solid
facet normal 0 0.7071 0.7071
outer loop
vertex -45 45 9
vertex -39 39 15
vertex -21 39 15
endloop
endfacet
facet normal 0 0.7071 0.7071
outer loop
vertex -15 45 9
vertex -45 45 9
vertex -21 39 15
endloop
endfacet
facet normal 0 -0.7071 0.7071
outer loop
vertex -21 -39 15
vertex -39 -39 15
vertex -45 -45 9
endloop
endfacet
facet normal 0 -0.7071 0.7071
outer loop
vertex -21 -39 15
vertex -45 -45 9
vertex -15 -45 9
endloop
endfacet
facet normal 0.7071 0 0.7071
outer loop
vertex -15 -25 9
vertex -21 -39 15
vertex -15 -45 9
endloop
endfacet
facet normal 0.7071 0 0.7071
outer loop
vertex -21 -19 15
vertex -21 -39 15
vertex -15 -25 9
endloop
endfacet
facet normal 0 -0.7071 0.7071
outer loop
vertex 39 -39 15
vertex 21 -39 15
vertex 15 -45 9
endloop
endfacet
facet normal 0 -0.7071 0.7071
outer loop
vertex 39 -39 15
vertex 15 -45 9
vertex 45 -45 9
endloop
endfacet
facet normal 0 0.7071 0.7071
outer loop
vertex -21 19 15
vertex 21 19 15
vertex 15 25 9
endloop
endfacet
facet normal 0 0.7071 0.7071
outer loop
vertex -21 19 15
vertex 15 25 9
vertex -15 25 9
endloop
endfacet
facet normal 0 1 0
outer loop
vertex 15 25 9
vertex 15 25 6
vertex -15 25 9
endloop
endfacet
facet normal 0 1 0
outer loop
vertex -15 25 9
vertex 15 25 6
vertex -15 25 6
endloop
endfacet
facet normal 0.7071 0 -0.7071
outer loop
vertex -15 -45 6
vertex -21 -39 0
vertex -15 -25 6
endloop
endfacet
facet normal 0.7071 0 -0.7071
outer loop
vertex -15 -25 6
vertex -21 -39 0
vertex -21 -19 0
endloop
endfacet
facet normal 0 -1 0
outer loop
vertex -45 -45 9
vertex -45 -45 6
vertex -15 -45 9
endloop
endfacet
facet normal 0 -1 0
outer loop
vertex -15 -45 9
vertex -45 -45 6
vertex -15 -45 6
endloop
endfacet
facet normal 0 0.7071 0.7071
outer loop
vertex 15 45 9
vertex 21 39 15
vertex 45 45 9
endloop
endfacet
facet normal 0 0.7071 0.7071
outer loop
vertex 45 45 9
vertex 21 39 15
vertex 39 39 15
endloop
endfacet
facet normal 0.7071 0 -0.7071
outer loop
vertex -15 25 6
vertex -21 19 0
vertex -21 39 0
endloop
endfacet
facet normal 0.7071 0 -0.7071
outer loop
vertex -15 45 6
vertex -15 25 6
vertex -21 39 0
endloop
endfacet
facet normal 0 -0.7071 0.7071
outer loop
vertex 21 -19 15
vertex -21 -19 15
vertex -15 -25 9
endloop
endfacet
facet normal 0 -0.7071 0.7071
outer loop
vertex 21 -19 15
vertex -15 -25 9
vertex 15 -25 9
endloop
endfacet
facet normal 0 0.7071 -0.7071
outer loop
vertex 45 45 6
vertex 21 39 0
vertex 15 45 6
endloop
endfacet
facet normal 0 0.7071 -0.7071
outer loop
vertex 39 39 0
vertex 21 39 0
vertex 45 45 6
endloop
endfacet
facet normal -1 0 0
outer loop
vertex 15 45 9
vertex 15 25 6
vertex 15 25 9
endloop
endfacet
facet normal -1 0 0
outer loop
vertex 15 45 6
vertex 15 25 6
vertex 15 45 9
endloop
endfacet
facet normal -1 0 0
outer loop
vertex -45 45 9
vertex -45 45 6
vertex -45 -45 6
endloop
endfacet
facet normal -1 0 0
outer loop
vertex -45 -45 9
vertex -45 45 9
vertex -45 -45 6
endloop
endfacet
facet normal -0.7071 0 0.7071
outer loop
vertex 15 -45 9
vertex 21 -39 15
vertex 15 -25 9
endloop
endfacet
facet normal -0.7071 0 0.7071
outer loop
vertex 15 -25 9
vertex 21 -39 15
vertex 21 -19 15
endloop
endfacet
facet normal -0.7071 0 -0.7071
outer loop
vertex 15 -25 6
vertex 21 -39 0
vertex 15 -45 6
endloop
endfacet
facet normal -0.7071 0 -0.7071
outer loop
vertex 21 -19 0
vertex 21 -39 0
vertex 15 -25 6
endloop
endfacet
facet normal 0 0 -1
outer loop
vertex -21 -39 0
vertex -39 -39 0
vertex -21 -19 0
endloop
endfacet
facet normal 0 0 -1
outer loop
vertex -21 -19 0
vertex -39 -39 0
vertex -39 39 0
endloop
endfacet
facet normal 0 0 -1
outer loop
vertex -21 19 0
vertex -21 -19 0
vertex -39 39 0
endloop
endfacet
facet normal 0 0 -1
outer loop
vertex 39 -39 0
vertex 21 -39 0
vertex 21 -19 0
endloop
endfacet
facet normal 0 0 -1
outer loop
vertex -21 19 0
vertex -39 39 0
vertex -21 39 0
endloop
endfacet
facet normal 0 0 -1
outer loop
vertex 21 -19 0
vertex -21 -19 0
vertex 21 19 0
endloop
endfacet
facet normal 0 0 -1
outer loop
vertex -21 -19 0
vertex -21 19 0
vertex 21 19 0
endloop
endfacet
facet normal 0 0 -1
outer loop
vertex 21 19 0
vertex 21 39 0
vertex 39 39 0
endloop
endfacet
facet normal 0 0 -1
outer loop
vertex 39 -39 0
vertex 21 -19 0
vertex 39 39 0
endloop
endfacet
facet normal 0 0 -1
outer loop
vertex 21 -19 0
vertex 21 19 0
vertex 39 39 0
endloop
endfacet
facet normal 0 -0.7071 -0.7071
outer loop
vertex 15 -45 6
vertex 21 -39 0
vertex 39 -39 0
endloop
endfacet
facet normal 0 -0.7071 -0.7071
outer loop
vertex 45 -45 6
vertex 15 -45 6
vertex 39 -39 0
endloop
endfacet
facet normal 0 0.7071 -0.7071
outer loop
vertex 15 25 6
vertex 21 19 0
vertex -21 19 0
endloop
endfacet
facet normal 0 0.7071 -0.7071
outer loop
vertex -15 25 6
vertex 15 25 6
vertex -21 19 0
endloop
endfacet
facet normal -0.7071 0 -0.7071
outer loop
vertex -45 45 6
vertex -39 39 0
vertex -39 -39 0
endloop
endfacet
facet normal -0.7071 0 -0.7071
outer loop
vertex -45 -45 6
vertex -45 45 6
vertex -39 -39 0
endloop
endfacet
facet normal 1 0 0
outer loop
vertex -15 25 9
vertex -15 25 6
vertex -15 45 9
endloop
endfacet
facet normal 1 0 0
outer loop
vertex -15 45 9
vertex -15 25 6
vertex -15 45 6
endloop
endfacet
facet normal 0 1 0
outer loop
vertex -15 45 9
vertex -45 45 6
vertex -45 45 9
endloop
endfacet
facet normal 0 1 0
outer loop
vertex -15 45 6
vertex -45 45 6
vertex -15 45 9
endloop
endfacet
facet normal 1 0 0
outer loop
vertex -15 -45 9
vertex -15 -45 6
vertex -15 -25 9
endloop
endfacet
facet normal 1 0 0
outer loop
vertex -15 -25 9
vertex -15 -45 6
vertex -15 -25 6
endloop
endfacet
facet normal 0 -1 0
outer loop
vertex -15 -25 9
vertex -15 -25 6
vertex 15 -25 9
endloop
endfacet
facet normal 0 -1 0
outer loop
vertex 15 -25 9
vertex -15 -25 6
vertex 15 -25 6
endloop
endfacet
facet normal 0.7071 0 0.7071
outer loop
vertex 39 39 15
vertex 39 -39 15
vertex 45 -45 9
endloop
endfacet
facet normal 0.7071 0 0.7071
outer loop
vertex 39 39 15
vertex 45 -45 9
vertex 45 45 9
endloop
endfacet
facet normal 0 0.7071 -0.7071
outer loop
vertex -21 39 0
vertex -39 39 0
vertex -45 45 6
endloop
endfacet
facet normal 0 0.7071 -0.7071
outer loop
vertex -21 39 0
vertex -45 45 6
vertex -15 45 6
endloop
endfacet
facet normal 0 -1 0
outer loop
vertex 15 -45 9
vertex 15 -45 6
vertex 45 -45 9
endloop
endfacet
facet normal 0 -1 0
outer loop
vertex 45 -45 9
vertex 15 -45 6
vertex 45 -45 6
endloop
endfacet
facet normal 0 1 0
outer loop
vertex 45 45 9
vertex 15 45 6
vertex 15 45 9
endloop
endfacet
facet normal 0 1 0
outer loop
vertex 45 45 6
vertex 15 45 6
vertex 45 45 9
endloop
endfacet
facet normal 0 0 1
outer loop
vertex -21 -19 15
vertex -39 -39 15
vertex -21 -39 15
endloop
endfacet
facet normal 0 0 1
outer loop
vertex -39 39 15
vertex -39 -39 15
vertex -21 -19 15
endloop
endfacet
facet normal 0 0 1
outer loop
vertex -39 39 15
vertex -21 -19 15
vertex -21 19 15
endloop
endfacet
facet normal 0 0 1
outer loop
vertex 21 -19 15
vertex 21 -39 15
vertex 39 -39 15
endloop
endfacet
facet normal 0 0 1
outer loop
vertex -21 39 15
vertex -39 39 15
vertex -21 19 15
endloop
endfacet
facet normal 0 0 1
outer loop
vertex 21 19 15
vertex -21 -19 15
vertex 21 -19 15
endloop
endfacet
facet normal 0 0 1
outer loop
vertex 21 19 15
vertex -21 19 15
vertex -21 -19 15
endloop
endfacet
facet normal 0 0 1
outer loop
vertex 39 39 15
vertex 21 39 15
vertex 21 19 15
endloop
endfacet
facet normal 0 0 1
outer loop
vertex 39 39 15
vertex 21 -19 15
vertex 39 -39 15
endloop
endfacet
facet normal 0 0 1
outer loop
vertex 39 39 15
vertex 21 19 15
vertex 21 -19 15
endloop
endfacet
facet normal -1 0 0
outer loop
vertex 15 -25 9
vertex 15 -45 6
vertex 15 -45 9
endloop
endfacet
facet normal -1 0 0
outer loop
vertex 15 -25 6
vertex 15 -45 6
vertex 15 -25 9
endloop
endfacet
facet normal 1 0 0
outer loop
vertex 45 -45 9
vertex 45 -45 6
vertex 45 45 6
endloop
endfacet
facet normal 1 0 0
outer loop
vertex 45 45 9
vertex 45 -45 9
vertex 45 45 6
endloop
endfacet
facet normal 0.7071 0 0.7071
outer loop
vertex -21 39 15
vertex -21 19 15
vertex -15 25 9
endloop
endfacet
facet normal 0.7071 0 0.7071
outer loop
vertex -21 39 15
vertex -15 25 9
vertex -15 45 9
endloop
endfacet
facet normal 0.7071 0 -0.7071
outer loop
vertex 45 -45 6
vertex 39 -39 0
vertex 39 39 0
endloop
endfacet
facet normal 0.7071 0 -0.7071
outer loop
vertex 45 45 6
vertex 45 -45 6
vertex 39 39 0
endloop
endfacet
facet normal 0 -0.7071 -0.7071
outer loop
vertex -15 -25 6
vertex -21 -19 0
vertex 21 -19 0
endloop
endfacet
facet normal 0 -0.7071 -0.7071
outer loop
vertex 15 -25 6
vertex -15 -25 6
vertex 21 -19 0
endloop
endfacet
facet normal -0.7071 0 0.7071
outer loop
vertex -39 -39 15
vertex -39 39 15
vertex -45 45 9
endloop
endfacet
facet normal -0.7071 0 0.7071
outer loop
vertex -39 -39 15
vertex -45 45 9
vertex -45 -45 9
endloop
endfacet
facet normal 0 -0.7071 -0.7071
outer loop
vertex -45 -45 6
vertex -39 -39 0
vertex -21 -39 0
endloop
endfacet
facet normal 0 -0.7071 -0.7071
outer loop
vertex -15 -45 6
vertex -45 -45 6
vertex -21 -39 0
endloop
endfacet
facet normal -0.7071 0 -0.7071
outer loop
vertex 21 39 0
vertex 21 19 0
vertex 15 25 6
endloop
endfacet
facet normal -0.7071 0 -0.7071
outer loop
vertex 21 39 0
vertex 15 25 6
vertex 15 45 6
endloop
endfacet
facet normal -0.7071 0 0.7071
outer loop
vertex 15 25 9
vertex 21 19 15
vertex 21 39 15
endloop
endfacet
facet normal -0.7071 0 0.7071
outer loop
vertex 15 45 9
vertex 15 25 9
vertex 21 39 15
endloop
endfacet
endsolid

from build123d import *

# Parameters (mm, degrees)
F0_W     = 30
F0_H     = 20
F1_DEPTH = 15
F2_SIZE  = 6


with BuildPart() as f1:
    # F0 (on Top) → F1 (new body)
    with BuildSketch(Plane.XY):
        with Locations((-30, 35)):
            Rectangle(F0_W, F0_H)
        Polygon((45, -25), (45, 25), (15, 25), (-15, 25), (-45, 25), (-45, -25), (-15, -25), (15, -25), align=None)
        with Locations((30, 35)):
            Rectangle(F0_W, F0_H)
        with Locations((30, -35)):
            Rectangle(F0_W, F0_H)
        with Locations((-30, -35)):
            Rectangle(F0_W, F0_H)
    extrude(amount=F1_DEPTH)

    # F2
    f2_edges = [f1.edges().sort_by_distance(p)[0] for p in [
        (-15, 35, 15),
        (-30, 45, 15),
        (-45, 0, 15),
        (-30, -45, 15),
        (-15, -35, 15),
        (0, -25, 15),
        (15, -35, 15),
        (30, -45, 15),
        (45, 0, 15),
        (30, 45, 15),
        (15, 35, 15),
        (0, 25, 15),
        (-15, 35, 0),
        (-30, 45, 0),
        (-45, 0, 0),
        (-30, -45, 0),
        (-15, -35, 0),
        (0, -25, 0),
        (15, -35, 0),
        (30, -45, 0),
        (45, 0, 0),
        (30, 45, 0),
        (15, 35, 0),
        (0, 25, 0),
    ]]
    chamfer(f2_edges, length=F2_SIZE)


solid = f1.part
